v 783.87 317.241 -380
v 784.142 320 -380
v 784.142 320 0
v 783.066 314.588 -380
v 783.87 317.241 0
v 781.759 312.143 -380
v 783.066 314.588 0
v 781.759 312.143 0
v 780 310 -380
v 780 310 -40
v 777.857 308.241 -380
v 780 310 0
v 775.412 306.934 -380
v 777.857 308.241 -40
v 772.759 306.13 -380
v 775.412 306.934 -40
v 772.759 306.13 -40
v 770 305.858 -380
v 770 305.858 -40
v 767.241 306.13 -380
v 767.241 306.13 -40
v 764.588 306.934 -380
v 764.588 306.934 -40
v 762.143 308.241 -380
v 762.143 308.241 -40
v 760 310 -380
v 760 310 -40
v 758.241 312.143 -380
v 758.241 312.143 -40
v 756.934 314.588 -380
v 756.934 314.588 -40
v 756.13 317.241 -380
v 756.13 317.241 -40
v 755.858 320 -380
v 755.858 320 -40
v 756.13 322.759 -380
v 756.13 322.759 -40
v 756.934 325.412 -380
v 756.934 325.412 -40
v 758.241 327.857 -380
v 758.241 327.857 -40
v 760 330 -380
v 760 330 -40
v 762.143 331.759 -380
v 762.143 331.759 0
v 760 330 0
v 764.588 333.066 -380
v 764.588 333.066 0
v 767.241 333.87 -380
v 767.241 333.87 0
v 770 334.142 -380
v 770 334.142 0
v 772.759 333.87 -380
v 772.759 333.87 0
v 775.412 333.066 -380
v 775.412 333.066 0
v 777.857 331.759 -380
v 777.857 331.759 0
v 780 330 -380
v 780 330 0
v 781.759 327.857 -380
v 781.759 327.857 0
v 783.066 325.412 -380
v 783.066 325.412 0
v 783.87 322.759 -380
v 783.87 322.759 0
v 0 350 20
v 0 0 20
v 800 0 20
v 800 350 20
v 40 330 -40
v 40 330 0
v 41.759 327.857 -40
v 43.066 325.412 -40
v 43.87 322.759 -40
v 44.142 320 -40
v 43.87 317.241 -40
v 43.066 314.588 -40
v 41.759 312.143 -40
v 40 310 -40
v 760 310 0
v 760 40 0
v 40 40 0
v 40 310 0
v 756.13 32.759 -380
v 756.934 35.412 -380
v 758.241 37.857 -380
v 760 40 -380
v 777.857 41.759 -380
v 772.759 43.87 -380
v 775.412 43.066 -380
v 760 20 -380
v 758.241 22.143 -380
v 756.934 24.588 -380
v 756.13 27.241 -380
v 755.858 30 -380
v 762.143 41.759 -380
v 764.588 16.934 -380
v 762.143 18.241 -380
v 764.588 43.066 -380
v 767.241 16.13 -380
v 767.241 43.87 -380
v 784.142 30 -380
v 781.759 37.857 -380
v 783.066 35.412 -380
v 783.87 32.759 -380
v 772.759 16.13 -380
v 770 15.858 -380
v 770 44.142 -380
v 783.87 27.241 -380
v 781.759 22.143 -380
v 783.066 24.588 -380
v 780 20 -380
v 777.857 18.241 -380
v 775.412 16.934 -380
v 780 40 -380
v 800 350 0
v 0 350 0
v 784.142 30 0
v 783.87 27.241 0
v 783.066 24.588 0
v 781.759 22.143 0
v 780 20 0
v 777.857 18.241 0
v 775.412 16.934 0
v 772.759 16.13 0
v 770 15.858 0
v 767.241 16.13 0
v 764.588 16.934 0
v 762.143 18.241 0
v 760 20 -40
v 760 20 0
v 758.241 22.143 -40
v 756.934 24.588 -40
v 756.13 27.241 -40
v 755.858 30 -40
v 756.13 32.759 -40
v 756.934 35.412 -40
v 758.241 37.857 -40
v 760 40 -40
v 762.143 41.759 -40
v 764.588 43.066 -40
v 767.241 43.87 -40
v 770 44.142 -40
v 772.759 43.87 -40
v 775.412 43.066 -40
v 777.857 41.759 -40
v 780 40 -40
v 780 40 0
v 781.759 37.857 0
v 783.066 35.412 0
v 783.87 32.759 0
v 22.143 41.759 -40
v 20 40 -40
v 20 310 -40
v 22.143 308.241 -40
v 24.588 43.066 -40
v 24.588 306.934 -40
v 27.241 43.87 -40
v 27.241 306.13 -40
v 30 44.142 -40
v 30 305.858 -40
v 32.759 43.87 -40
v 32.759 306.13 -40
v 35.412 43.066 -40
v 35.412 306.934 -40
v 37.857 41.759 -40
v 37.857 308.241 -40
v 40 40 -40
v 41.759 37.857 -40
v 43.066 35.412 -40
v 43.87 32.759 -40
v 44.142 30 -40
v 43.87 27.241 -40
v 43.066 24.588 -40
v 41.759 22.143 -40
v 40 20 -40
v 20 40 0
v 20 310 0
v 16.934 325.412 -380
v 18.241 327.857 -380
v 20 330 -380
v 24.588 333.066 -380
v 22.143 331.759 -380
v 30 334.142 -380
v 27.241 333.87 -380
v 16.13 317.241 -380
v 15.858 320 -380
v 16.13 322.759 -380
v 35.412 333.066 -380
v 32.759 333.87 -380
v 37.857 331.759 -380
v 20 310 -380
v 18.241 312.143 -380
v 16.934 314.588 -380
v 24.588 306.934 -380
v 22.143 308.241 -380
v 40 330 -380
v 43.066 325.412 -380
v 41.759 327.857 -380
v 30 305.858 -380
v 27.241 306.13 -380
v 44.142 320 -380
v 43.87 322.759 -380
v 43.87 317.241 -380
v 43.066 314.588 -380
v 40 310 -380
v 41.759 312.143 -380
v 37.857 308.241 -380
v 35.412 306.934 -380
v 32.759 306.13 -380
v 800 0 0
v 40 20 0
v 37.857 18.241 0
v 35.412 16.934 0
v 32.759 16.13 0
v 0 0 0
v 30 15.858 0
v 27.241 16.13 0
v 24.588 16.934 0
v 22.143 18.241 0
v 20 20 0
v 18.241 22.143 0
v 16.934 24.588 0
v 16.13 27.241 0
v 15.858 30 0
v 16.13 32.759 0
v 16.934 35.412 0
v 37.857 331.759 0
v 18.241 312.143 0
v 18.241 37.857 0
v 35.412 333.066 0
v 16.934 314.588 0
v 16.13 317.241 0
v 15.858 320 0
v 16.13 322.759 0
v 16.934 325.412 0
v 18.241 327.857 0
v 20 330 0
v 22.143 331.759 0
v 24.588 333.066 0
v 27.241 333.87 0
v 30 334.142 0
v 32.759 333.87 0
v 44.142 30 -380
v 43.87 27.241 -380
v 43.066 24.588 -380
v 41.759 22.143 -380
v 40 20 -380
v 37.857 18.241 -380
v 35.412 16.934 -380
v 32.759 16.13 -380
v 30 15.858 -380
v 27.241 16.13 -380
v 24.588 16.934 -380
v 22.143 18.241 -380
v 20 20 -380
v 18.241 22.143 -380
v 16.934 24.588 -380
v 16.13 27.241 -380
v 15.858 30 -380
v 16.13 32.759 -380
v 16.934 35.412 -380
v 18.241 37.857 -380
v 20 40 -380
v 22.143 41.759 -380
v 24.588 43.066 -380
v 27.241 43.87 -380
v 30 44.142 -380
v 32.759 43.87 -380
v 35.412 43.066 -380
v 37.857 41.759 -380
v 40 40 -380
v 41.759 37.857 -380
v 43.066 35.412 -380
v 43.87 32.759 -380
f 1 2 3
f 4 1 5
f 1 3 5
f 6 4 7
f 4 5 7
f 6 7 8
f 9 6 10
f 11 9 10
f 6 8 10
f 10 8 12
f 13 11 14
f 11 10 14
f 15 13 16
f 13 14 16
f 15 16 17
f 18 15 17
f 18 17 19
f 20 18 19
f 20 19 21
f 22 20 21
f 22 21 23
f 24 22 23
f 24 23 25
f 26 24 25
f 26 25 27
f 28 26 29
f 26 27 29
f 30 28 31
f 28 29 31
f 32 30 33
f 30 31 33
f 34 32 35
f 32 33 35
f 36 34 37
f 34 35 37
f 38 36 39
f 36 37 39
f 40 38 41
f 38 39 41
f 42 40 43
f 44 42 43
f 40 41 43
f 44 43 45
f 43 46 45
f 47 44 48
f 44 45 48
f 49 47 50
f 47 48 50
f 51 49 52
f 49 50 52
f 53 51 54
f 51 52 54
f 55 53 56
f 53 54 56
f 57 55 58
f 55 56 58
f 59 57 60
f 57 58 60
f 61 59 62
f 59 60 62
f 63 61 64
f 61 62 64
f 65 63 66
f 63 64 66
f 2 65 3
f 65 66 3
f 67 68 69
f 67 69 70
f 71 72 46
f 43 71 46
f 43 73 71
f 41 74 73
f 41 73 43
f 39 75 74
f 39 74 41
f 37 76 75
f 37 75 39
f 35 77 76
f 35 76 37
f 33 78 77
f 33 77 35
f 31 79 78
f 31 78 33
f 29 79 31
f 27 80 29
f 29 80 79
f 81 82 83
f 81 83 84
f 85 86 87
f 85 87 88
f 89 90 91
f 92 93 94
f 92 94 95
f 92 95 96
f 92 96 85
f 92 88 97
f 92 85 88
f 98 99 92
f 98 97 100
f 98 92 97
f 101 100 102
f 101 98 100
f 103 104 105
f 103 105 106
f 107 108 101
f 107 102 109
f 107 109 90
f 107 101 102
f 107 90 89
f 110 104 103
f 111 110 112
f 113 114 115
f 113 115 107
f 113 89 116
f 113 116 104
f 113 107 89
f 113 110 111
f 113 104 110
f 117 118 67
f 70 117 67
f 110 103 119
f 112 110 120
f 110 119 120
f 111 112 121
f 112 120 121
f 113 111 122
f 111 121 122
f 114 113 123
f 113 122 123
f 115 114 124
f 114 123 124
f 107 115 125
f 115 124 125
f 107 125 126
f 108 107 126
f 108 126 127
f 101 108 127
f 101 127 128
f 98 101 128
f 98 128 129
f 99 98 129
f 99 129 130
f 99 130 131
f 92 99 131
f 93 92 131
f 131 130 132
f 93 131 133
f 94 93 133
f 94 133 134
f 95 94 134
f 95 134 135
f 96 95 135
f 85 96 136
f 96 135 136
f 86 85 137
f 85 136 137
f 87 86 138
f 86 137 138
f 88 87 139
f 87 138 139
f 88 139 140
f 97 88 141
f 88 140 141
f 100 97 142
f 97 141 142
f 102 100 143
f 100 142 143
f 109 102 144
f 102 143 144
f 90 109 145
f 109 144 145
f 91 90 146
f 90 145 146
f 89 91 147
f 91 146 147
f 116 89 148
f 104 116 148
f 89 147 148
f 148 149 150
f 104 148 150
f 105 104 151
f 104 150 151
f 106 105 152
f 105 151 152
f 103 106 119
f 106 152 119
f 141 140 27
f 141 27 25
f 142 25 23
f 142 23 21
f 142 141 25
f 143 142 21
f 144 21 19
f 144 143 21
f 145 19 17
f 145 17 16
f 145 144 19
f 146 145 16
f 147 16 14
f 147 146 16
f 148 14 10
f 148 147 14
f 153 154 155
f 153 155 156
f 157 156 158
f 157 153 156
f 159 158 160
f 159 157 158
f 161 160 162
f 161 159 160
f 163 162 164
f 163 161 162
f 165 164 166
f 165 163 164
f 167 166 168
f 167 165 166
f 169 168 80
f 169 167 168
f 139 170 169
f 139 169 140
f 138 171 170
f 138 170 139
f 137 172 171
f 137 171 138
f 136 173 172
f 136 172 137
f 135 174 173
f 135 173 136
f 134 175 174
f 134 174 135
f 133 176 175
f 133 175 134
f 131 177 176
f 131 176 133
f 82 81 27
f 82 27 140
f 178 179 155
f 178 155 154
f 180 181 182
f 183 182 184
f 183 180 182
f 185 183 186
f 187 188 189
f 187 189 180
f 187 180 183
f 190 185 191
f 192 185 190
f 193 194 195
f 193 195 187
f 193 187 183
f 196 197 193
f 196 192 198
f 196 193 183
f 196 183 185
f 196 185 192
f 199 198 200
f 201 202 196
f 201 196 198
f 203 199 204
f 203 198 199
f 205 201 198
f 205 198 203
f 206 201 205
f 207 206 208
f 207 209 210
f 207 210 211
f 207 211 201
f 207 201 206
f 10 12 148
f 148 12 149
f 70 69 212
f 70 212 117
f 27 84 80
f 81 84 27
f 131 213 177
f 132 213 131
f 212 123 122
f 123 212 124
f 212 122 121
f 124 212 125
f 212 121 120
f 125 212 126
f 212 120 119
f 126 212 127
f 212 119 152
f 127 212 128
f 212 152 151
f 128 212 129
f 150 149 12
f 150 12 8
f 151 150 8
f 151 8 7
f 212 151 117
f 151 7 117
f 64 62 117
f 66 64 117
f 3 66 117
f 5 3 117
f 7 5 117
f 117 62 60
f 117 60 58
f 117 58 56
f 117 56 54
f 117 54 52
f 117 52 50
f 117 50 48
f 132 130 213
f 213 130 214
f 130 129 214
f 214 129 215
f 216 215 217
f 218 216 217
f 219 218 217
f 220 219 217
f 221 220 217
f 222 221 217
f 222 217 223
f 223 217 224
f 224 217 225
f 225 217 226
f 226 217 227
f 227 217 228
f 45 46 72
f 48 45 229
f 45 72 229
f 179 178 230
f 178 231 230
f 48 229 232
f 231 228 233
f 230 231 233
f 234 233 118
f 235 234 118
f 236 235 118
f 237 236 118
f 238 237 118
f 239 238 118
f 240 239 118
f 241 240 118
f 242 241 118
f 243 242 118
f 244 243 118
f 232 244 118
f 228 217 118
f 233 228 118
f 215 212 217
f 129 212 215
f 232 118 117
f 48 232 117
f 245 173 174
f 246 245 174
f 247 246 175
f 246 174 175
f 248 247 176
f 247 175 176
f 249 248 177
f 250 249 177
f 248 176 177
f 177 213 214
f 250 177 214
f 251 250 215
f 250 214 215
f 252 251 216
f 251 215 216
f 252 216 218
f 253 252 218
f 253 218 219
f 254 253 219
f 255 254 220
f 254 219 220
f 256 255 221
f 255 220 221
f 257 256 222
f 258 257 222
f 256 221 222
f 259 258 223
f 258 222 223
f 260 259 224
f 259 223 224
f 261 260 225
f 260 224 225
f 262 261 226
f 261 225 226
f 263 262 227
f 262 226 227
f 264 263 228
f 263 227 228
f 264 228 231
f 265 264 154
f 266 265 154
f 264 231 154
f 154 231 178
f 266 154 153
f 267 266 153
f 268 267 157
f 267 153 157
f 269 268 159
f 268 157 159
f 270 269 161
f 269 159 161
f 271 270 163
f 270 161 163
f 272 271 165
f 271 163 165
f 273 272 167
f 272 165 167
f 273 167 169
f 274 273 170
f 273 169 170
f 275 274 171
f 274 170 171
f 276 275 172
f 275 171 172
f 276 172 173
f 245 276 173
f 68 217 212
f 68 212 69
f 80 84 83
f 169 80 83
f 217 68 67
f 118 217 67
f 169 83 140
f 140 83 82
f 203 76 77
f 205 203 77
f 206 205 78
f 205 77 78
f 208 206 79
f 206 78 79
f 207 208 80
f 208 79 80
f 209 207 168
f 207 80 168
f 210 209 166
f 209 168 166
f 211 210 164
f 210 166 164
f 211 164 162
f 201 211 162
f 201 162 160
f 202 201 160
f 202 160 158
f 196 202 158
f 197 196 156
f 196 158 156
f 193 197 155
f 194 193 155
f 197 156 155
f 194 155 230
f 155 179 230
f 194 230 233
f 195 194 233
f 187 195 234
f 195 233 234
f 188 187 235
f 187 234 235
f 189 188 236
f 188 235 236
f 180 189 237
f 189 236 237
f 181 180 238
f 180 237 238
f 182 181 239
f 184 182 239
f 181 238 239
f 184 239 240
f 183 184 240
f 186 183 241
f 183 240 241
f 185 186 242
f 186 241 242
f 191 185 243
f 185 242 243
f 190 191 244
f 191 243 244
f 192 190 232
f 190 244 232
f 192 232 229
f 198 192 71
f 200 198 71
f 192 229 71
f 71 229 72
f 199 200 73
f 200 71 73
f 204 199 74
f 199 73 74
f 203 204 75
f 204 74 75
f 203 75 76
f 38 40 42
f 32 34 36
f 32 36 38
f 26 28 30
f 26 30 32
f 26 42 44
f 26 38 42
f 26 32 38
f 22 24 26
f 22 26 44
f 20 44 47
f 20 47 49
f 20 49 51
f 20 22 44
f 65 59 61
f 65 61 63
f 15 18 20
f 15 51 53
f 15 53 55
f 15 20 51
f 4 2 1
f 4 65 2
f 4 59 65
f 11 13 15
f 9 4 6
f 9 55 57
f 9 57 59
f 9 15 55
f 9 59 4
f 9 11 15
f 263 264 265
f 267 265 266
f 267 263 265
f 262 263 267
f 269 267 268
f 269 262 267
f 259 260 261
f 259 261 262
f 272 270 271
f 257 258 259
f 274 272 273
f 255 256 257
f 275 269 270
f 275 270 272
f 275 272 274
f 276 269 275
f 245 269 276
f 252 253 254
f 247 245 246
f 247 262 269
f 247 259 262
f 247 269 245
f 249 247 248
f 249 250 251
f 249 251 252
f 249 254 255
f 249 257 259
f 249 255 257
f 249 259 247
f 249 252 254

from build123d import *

# Parameters (mm, degrees)
F0_W     = 350
F0_H     = 20
F1_DEPTH = 800
F2_W     = 760
F2_H     = 310
F2_W_2   = 720
F2_H_2   = 270
F3_DEPTH = 40
F4_R     = 14.142136
F5_DEPTH = 380


with BuildPart() as f1:
    # F0 (on Right) → F1 (new body)
    with BuildSketch(Plane.YZ):
        with Locations((175, 10)):
            Rectangle(F0_W, F0_H)
    extrude(amount=F1_DEPTH)

    # F2 (on face) → F3 (join)
    with BuildSketch(Plane(origin=(0, 0, 0), x_dir=(1, 0, 0), z_dir=(0, 0, -1))):
        with Locations((400, -175)):
            Rectangle(F2_W, F2_H)
        with Locations((400, -175)):
            Rectangle(F2_W_2, F2_H_2, mode=Mode.SUBTRACT)
    extrude(amount=F3_DEPTH)

    # F4 (on face) → F5 (join)
    with BuildSketch(Plane(origin=(0, 0, 0), x_dir=(1, 0, 0), z_dir=(0, 0, -1))):
        with Locations((30, -30)):
            Circle(F4_R)
        with Locations((770, -30)):
            Circle(F4_R)
        with Locations((30, -320)):
            Circle(F4_R)
        with Locations((770, -320)):
            Circle(F4_R)
    extrude(amount=F5_DEPTH)


solid = f1.part
